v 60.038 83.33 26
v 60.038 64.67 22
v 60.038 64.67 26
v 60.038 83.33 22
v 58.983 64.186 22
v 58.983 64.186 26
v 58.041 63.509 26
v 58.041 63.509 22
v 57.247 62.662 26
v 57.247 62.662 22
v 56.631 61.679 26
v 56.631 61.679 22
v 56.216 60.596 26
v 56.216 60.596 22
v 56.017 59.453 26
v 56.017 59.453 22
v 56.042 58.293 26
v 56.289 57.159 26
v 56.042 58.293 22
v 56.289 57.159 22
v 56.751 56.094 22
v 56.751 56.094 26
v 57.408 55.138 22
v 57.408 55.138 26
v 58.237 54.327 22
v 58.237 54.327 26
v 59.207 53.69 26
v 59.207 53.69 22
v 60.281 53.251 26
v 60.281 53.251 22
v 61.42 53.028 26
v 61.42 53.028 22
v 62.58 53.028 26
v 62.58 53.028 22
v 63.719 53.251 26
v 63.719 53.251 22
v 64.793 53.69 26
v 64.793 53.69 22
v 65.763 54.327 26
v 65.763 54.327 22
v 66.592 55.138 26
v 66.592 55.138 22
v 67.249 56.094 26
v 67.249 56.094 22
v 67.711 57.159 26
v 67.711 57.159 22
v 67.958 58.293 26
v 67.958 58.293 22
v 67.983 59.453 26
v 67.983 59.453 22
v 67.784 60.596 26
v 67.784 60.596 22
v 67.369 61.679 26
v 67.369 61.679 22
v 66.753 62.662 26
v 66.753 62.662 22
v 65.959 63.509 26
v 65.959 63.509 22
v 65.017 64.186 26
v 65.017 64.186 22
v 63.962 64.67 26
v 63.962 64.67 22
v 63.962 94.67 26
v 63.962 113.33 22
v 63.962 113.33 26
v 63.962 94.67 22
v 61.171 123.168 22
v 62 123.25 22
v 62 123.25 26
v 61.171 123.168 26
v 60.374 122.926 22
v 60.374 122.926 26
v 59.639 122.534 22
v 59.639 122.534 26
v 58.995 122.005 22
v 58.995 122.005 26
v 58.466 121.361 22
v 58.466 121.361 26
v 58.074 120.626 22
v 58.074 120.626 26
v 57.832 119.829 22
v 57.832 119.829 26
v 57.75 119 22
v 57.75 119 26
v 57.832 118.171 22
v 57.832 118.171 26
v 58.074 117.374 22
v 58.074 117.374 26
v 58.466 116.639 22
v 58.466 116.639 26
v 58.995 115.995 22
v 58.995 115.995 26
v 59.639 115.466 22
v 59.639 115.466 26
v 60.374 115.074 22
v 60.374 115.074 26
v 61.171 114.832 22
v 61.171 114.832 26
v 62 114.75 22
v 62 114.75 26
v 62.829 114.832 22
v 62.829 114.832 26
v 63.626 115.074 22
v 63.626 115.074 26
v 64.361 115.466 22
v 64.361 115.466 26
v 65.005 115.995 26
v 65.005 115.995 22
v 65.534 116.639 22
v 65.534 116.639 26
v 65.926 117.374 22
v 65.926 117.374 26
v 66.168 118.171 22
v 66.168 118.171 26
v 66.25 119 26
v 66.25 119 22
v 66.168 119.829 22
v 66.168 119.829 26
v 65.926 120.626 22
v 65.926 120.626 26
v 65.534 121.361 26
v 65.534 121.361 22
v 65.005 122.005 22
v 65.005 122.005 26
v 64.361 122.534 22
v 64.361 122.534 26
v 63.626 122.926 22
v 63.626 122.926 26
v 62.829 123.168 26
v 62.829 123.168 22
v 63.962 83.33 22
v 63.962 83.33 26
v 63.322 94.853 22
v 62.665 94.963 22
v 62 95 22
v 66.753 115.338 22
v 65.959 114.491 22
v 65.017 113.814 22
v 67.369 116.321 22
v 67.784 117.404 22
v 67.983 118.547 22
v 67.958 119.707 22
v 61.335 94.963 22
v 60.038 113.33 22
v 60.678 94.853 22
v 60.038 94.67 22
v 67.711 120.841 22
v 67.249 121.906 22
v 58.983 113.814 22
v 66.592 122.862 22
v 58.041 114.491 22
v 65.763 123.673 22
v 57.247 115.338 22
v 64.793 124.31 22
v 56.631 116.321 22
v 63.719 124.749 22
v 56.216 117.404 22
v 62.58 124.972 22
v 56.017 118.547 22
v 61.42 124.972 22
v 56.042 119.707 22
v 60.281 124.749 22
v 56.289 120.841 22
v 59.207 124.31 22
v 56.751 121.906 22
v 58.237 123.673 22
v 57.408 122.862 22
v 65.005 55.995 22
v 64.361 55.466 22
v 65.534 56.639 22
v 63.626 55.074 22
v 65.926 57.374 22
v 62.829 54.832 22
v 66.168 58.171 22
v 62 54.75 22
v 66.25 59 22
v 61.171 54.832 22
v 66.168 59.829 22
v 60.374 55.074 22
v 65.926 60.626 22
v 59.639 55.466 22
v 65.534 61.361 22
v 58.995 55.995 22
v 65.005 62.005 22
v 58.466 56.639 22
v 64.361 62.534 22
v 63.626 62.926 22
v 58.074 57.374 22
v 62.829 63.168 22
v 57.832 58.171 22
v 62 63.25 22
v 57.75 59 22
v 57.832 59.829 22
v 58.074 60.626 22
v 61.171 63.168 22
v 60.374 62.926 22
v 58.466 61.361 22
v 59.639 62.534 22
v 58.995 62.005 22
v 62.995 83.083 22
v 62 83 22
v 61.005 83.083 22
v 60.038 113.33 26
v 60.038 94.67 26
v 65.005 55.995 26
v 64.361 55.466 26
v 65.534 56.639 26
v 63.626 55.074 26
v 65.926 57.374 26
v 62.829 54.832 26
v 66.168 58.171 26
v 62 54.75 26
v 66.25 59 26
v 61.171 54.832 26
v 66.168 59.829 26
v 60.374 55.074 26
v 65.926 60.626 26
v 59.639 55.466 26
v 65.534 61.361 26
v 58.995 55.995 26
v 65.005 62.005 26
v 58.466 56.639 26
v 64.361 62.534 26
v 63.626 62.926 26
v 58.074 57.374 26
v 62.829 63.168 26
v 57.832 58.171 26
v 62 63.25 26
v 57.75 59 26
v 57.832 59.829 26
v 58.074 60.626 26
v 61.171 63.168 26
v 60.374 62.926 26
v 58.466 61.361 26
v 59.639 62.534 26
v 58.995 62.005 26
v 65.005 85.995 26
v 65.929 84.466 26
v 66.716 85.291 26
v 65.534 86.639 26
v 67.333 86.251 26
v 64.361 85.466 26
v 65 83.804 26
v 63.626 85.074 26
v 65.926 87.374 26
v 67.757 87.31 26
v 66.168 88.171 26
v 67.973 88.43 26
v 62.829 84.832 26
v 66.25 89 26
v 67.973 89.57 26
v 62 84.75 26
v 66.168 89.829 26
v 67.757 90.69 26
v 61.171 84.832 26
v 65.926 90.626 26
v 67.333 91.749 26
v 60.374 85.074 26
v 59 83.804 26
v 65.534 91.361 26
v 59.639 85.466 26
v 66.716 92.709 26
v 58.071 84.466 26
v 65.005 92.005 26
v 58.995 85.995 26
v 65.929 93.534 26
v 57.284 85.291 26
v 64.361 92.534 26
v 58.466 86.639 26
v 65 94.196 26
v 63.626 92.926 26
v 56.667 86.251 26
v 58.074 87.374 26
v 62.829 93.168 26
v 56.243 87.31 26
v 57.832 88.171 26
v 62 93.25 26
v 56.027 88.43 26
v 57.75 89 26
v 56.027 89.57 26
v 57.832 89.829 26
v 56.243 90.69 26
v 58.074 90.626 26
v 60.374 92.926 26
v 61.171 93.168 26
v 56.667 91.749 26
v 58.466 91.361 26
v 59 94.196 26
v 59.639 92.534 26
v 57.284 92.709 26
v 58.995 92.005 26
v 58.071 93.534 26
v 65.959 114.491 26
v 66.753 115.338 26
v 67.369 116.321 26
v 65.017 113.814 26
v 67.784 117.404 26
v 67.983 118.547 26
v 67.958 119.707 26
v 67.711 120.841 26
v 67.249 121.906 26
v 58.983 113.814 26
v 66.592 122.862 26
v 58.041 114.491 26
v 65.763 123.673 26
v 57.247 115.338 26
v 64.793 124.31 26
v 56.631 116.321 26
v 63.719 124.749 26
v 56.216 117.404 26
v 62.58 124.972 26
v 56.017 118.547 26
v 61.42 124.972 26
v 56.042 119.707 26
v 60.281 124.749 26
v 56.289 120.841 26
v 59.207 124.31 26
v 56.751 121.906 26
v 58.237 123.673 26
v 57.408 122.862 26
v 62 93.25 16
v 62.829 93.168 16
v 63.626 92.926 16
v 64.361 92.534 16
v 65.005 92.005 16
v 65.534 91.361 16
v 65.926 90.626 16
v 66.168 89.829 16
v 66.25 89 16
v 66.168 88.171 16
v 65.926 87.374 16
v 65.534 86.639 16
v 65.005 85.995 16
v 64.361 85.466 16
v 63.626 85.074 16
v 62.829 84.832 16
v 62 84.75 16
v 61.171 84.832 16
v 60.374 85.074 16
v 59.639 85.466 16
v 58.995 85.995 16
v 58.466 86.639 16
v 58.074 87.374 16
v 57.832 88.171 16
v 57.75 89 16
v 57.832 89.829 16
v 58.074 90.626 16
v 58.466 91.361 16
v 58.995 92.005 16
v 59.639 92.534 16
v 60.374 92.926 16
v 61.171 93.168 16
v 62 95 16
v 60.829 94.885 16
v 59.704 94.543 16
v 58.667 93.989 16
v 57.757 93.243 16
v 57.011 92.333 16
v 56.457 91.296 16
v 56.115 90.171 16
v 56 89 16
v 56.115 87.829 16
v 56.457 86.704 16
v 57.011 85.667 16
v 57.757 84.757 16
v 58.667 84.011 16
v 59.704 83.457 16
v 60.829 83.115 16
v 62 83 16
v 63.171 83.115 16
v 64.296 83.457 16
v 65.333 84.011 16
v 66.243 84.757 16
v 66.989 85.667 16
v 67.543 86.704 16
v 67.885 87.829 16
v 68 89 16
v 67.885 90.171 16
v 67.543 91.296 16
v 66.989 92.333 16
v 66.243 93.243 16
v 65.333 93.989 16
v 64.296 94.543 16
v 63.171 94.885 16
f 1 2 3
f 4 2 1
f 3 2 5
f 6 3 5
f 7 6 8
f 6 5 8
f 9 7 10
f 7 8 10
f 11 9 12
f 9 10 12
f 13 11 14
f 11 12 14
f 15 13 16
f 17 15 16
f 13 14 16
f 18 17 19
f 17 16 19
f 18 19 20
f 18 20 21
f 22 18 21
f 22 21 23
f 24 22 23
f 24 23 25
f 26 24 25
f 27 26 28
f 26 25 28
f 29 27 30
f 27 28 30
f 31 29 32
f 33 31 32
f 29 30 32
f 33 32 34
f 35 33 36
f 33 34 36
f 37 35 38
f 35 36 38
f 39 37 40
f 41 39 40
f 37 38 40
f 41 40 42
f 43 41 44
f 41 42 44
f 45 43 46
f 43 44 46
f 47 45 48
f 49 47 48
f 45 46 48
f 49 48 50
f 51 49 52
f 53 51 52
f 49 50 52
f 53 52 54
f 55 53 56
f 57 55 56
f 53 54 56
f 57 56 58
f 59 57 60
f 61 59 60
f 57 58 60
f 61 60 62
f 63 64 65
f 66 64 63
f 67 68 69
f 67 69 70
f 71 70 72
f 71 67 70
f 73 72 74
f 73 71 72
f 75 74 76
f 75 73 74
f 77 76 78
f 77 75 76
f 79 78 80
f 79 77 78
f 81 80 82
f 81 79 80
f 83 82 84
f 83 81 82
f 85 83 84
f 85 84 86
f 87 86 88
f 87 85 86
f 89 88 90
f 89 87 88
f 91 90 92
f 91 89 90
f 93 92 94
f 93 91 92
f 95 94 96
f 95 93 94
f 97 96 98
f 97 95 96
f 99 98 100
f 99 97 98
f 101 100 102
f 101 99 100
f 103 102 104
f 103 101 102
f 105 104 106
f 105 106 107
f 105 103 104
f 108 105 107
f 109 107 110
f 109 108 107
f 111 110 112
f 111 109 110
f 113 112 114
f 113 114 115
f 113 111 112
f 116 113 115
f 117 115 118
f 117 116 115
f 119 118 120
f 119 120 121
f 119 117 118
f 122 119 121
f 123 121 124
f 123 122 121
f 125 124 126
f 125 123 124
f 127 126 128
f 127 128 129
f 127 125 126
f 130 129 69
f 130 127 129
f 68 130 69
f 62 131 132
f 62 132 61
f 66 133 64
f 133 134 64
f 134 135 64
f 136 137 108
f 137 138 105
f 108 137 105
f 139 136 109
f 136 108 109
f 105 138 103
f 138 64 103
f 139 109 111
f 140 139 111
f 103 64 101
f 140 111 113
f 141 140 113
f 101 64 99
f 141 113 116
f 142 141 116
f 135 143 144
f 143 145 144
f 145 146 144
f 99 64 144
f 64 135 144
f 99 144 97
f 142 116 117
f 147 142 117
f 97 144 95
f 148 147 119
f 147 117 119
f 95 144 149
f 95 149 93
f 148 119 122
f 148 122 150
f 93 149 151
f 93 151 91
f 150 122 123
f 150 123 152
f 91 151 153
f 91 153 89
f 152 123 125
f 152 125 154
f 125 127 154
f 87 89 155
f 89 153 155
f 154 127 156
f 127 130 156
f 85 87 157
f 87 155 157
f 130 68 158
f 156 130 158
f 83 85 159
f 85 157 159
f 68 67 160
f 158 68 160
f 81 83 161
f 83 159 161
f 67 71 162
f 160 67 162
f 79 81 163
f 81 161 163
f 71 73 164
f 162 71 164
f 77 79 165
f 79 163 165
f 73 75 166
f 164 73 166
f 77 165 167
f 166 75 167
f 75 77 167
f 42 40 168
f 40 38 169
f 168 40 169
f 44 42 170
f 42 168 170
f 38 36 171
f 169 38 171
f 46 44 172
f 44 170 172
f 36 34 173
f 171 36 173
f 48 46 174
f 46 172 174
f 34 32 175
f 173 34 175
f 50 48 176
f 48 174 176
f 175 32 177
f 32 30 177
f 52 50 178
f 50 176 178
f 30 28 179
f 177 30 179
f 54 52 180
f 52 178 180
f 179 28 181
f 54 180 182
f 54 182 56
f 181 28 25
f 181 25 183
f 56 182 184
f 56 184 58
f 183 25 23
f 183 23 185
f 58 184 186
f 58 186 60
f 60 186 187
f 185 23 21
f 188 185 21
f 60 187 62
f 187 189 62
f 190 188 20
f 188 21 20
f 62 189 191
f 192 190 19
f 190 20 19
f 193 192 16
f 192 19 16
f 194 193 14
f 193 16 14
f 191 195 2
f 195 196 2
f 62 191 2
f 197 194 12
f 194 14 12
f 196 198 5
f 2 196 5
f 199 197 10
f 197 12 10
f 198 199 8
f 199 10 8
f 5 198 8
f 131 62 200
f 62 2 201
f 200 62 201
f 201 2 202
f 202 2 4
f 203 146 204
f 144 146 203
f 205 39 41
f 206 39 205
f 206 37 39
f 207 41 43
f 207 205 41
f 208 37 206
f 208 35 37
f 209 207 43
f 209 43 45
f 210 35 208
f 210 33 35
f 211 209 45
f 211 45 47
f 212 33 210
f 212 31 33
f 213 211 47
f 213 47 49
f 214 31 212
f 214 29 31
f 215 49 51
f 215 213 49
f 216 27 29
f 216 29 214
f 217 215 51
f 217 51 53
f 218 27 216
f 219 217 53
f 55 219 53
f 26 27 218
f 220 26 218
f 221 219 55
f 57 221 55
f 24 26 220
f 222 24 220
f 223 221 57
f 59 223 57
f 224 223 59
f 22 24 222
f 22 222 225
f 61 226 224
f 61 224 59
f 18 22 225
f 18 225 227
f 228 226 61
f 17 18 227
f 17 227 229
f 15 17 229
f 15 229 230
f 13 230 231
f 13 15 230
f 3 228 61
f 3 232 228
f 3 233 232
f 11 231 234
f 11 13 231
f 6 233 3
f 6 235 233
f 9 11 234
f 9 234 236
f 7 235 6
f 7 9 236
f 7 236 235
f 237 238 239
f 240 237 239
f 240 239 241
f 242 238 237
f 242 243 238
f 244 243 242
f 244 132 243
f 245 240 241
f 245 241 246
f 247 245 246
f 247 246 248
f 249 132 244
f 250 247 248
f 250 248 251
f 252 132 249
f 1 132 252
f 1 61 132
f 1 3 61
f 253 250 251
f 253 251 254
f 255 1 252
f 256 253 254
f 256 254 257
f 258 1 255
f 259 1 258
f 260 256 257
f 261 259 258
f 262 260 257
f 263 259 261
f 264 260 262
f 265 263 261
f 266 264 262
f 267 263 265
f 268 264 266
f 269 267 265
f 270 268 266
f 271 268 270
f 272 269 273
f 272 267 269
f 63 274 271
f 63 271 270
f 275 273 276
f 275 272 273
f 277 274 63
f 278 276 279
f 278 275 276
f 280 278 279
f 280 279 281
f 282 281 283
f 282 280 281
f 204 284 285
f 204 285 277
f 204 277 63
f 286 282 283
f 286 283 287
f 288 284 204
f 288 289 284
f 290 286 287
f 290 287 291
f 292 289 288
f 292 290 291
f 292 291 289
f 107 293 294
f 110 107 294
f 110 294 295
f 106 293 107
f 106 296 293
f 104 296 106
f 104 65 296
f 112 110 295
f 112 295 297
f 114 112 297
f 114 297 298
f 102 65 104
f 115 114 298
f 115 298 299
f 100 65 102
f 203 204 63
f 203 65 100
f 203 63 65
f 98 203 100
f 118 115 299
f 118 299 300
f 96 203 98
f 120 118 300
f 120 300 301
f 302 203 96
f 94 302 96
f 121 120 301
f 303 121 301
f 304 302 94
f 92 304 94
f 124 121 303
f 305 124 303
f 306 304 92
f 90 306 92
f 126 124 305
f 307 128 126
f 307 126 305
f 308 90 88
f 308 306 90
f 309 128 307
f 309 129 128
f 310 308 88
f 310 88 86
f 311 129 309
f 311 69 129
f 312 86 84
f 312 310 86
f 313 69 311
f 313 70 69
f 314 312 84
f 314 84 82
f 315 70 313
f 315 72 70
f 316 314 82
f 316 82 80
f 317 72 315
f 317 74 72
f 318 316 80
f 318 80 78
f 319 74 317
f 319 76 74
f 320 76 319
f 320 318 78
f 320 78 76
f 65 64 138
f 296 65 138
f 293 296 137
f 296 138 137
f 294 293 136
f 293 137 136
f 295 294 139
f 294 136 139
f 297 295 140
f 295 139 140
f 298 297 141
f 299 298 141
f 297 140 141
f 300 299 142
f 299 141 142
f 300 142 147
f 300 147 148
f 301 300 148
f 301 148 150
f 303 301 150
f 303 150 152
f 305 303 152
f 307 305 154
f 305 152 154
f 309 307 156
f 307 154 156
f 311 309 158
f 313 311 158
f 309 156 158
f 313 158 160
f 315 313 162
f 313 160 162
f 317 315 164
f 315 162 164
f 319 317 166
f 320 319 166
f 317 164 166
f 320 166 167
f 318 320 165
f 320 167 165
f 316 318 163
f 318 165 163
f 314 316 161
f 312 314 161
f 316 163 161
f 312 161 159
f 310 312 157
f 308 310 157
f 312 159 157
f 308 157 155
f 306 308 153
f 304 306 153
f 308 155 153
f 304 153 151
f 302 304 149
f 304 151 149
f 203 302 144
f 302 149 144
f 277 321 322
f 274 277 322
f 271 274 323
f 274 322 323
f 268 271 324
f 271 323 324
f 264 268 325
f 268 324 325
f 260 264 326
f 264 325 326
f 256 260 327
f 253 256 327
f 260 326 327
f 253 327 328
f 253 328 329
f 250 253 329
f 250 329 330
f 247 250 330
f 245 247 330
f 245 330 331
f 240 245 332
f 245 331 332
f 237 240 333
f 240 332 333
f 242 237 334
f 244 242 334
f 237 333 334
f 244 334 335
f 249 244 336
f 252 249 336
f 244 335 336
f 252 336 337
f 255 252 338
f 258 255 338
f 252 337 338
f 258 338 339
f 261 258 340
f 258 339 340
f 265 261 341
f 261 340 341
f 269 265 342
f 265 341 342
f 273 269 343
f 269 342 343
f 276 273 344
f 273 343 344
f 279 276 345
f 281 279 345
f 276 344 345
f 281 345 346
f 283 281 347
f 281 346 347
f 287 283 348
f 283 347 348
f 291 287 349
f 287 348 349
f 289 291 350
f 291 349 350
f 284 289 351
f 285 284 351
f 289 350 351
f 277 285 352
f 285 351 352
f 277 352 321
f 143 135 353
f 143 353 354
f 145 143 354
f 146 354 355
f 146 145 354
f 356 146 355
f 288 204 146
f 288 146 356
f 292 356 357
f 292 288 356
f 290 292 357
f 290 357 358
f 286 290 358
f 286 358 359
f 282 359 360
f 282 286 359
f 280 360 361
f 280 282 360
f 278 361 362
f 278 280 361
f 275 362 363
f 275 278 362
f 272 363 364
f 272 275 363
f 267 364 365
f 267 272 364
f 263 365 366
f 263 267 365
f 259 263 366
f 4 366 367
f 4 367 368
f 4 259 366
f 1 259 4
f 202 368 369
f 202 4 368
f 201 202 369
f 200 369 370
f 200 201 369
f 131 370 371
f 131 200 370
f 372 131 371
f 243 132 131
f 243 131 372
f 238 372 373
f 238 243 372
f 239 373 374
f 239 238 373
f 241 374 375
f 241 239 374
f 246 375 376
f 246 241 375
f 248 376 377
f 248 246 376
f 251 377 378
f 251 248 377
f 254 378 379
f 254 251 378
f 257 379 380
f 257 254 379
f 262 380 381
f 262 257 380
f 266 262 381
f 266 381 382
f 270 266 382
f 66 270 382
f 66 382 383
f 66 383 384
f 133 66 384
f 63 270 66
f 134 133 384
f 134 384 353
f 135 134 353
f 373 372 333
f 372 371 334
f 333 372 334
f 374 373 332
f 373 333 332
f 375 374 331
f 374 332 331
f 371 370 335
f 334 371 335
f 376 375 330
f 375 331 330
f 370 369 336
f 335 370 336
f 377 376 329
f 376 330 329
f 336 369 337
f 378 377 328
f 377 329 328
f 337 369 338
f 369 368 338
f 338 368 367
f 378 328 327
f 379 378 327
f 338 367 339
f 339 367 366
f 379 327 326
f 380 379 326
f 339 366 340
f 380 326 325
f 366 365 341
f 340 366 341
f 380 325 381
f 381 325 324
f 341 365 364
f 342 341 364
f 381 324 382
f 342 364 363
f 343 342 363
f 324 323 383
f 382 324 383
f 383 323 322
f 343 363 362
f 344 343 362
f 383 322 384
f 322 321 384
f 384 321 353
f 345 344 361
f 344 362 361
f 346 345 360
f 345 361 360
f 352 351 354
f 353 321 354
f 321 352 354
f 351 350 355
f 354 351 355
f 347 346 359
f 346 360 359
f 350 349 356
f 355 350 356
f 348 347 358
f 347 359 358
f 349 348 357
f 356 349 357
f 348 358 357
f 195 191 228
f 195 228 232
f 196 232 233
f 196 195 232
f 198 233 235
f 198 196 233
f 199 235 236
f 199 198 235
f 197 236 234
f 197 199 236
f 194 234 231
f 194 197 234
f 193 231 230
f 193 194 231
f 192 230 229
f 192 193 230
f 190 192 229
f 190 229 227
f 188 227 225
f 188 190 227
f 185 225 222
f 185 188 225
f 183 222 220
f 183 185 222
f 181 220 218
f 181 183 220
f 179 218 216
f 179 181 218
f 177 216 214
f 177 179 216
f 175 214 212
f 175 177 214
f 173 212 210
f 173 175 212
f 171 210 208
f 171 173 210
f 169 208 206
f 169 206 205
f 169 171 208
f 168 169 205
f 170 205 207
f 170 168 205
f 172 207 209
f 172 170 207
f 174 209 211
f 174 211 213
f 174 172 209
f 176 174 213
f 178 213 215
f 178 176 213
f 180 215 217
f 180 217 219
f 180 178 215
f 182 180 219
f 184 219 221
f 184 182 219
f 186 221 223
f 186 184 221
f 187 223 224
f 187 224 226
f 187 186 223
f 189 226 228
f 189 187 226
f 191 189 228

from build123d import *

# Parameters (mm, degrees)
SKETCH036_R             = 4.25
PAD014_DEPTH            = 4
SKETCH087_R             = 6
PAD030_DEPTH            = 10
SKETCH088_R             = 4.25
POCKET039_DEPTH         = 10
BODY005_PLACEMENT_ANGLE = 90


with BuildPart() as part:
    # Sketch036 → Pad014 (new body)
    with BuildSketch(Plane.XY):
        with BuildLine():
            ThreePointArc((5.67, 1.962422), (-6, 0), (5.67, -1.962422))
            Line((54.33, -1.962422), (5.67, -1.962422))
            ThreePointArc((54.33, -1.962422), (66, 0), (54.33, 1.962422))
            Line((5.67, 1.962422), (54.33, 1.962422))
        make_face()
        Circle(SKETCH036_R, mode=Mode.SUBTRACT)
        with Locations((60, 0)):
            Circle(SKETCH036_R, mode=Mode.SUBTRACT)
    extrude(amount=PAD014_DEPTH)

    # Sketch087 (on Face8 of Pad014) → Pad030 (join)
    with BuildSketch(Plane.XY.offset(4)):
        with Locations((30, 0)):
            Circle(SKETCH087_R)
    extrude(amount=-PAD030_DEPTH)

    # Sketch088 (on Face14 of Pad030) → Pocket039 (cut)
    with BuildSketch(Plane(origin=(0, 0, -6), x_dir=(1, 0, 0), z_dir=(0, 0, -1))):
        with Locations((30, 0)):
            Circle(SKETCH088_R)
    extrude(amount=-POCKET039_DEPTH, mode=Mode.SUBTRACT)


with BuildPart() as part_1:
    # Body005 placement: moved
    add(part.part.moved(Location((62, 59, 22))).rotate(Axis((62, 59, 22), (0, 0, 1)), BODY005_PLACEMENT_ANGLE))


solid = part_1.part
